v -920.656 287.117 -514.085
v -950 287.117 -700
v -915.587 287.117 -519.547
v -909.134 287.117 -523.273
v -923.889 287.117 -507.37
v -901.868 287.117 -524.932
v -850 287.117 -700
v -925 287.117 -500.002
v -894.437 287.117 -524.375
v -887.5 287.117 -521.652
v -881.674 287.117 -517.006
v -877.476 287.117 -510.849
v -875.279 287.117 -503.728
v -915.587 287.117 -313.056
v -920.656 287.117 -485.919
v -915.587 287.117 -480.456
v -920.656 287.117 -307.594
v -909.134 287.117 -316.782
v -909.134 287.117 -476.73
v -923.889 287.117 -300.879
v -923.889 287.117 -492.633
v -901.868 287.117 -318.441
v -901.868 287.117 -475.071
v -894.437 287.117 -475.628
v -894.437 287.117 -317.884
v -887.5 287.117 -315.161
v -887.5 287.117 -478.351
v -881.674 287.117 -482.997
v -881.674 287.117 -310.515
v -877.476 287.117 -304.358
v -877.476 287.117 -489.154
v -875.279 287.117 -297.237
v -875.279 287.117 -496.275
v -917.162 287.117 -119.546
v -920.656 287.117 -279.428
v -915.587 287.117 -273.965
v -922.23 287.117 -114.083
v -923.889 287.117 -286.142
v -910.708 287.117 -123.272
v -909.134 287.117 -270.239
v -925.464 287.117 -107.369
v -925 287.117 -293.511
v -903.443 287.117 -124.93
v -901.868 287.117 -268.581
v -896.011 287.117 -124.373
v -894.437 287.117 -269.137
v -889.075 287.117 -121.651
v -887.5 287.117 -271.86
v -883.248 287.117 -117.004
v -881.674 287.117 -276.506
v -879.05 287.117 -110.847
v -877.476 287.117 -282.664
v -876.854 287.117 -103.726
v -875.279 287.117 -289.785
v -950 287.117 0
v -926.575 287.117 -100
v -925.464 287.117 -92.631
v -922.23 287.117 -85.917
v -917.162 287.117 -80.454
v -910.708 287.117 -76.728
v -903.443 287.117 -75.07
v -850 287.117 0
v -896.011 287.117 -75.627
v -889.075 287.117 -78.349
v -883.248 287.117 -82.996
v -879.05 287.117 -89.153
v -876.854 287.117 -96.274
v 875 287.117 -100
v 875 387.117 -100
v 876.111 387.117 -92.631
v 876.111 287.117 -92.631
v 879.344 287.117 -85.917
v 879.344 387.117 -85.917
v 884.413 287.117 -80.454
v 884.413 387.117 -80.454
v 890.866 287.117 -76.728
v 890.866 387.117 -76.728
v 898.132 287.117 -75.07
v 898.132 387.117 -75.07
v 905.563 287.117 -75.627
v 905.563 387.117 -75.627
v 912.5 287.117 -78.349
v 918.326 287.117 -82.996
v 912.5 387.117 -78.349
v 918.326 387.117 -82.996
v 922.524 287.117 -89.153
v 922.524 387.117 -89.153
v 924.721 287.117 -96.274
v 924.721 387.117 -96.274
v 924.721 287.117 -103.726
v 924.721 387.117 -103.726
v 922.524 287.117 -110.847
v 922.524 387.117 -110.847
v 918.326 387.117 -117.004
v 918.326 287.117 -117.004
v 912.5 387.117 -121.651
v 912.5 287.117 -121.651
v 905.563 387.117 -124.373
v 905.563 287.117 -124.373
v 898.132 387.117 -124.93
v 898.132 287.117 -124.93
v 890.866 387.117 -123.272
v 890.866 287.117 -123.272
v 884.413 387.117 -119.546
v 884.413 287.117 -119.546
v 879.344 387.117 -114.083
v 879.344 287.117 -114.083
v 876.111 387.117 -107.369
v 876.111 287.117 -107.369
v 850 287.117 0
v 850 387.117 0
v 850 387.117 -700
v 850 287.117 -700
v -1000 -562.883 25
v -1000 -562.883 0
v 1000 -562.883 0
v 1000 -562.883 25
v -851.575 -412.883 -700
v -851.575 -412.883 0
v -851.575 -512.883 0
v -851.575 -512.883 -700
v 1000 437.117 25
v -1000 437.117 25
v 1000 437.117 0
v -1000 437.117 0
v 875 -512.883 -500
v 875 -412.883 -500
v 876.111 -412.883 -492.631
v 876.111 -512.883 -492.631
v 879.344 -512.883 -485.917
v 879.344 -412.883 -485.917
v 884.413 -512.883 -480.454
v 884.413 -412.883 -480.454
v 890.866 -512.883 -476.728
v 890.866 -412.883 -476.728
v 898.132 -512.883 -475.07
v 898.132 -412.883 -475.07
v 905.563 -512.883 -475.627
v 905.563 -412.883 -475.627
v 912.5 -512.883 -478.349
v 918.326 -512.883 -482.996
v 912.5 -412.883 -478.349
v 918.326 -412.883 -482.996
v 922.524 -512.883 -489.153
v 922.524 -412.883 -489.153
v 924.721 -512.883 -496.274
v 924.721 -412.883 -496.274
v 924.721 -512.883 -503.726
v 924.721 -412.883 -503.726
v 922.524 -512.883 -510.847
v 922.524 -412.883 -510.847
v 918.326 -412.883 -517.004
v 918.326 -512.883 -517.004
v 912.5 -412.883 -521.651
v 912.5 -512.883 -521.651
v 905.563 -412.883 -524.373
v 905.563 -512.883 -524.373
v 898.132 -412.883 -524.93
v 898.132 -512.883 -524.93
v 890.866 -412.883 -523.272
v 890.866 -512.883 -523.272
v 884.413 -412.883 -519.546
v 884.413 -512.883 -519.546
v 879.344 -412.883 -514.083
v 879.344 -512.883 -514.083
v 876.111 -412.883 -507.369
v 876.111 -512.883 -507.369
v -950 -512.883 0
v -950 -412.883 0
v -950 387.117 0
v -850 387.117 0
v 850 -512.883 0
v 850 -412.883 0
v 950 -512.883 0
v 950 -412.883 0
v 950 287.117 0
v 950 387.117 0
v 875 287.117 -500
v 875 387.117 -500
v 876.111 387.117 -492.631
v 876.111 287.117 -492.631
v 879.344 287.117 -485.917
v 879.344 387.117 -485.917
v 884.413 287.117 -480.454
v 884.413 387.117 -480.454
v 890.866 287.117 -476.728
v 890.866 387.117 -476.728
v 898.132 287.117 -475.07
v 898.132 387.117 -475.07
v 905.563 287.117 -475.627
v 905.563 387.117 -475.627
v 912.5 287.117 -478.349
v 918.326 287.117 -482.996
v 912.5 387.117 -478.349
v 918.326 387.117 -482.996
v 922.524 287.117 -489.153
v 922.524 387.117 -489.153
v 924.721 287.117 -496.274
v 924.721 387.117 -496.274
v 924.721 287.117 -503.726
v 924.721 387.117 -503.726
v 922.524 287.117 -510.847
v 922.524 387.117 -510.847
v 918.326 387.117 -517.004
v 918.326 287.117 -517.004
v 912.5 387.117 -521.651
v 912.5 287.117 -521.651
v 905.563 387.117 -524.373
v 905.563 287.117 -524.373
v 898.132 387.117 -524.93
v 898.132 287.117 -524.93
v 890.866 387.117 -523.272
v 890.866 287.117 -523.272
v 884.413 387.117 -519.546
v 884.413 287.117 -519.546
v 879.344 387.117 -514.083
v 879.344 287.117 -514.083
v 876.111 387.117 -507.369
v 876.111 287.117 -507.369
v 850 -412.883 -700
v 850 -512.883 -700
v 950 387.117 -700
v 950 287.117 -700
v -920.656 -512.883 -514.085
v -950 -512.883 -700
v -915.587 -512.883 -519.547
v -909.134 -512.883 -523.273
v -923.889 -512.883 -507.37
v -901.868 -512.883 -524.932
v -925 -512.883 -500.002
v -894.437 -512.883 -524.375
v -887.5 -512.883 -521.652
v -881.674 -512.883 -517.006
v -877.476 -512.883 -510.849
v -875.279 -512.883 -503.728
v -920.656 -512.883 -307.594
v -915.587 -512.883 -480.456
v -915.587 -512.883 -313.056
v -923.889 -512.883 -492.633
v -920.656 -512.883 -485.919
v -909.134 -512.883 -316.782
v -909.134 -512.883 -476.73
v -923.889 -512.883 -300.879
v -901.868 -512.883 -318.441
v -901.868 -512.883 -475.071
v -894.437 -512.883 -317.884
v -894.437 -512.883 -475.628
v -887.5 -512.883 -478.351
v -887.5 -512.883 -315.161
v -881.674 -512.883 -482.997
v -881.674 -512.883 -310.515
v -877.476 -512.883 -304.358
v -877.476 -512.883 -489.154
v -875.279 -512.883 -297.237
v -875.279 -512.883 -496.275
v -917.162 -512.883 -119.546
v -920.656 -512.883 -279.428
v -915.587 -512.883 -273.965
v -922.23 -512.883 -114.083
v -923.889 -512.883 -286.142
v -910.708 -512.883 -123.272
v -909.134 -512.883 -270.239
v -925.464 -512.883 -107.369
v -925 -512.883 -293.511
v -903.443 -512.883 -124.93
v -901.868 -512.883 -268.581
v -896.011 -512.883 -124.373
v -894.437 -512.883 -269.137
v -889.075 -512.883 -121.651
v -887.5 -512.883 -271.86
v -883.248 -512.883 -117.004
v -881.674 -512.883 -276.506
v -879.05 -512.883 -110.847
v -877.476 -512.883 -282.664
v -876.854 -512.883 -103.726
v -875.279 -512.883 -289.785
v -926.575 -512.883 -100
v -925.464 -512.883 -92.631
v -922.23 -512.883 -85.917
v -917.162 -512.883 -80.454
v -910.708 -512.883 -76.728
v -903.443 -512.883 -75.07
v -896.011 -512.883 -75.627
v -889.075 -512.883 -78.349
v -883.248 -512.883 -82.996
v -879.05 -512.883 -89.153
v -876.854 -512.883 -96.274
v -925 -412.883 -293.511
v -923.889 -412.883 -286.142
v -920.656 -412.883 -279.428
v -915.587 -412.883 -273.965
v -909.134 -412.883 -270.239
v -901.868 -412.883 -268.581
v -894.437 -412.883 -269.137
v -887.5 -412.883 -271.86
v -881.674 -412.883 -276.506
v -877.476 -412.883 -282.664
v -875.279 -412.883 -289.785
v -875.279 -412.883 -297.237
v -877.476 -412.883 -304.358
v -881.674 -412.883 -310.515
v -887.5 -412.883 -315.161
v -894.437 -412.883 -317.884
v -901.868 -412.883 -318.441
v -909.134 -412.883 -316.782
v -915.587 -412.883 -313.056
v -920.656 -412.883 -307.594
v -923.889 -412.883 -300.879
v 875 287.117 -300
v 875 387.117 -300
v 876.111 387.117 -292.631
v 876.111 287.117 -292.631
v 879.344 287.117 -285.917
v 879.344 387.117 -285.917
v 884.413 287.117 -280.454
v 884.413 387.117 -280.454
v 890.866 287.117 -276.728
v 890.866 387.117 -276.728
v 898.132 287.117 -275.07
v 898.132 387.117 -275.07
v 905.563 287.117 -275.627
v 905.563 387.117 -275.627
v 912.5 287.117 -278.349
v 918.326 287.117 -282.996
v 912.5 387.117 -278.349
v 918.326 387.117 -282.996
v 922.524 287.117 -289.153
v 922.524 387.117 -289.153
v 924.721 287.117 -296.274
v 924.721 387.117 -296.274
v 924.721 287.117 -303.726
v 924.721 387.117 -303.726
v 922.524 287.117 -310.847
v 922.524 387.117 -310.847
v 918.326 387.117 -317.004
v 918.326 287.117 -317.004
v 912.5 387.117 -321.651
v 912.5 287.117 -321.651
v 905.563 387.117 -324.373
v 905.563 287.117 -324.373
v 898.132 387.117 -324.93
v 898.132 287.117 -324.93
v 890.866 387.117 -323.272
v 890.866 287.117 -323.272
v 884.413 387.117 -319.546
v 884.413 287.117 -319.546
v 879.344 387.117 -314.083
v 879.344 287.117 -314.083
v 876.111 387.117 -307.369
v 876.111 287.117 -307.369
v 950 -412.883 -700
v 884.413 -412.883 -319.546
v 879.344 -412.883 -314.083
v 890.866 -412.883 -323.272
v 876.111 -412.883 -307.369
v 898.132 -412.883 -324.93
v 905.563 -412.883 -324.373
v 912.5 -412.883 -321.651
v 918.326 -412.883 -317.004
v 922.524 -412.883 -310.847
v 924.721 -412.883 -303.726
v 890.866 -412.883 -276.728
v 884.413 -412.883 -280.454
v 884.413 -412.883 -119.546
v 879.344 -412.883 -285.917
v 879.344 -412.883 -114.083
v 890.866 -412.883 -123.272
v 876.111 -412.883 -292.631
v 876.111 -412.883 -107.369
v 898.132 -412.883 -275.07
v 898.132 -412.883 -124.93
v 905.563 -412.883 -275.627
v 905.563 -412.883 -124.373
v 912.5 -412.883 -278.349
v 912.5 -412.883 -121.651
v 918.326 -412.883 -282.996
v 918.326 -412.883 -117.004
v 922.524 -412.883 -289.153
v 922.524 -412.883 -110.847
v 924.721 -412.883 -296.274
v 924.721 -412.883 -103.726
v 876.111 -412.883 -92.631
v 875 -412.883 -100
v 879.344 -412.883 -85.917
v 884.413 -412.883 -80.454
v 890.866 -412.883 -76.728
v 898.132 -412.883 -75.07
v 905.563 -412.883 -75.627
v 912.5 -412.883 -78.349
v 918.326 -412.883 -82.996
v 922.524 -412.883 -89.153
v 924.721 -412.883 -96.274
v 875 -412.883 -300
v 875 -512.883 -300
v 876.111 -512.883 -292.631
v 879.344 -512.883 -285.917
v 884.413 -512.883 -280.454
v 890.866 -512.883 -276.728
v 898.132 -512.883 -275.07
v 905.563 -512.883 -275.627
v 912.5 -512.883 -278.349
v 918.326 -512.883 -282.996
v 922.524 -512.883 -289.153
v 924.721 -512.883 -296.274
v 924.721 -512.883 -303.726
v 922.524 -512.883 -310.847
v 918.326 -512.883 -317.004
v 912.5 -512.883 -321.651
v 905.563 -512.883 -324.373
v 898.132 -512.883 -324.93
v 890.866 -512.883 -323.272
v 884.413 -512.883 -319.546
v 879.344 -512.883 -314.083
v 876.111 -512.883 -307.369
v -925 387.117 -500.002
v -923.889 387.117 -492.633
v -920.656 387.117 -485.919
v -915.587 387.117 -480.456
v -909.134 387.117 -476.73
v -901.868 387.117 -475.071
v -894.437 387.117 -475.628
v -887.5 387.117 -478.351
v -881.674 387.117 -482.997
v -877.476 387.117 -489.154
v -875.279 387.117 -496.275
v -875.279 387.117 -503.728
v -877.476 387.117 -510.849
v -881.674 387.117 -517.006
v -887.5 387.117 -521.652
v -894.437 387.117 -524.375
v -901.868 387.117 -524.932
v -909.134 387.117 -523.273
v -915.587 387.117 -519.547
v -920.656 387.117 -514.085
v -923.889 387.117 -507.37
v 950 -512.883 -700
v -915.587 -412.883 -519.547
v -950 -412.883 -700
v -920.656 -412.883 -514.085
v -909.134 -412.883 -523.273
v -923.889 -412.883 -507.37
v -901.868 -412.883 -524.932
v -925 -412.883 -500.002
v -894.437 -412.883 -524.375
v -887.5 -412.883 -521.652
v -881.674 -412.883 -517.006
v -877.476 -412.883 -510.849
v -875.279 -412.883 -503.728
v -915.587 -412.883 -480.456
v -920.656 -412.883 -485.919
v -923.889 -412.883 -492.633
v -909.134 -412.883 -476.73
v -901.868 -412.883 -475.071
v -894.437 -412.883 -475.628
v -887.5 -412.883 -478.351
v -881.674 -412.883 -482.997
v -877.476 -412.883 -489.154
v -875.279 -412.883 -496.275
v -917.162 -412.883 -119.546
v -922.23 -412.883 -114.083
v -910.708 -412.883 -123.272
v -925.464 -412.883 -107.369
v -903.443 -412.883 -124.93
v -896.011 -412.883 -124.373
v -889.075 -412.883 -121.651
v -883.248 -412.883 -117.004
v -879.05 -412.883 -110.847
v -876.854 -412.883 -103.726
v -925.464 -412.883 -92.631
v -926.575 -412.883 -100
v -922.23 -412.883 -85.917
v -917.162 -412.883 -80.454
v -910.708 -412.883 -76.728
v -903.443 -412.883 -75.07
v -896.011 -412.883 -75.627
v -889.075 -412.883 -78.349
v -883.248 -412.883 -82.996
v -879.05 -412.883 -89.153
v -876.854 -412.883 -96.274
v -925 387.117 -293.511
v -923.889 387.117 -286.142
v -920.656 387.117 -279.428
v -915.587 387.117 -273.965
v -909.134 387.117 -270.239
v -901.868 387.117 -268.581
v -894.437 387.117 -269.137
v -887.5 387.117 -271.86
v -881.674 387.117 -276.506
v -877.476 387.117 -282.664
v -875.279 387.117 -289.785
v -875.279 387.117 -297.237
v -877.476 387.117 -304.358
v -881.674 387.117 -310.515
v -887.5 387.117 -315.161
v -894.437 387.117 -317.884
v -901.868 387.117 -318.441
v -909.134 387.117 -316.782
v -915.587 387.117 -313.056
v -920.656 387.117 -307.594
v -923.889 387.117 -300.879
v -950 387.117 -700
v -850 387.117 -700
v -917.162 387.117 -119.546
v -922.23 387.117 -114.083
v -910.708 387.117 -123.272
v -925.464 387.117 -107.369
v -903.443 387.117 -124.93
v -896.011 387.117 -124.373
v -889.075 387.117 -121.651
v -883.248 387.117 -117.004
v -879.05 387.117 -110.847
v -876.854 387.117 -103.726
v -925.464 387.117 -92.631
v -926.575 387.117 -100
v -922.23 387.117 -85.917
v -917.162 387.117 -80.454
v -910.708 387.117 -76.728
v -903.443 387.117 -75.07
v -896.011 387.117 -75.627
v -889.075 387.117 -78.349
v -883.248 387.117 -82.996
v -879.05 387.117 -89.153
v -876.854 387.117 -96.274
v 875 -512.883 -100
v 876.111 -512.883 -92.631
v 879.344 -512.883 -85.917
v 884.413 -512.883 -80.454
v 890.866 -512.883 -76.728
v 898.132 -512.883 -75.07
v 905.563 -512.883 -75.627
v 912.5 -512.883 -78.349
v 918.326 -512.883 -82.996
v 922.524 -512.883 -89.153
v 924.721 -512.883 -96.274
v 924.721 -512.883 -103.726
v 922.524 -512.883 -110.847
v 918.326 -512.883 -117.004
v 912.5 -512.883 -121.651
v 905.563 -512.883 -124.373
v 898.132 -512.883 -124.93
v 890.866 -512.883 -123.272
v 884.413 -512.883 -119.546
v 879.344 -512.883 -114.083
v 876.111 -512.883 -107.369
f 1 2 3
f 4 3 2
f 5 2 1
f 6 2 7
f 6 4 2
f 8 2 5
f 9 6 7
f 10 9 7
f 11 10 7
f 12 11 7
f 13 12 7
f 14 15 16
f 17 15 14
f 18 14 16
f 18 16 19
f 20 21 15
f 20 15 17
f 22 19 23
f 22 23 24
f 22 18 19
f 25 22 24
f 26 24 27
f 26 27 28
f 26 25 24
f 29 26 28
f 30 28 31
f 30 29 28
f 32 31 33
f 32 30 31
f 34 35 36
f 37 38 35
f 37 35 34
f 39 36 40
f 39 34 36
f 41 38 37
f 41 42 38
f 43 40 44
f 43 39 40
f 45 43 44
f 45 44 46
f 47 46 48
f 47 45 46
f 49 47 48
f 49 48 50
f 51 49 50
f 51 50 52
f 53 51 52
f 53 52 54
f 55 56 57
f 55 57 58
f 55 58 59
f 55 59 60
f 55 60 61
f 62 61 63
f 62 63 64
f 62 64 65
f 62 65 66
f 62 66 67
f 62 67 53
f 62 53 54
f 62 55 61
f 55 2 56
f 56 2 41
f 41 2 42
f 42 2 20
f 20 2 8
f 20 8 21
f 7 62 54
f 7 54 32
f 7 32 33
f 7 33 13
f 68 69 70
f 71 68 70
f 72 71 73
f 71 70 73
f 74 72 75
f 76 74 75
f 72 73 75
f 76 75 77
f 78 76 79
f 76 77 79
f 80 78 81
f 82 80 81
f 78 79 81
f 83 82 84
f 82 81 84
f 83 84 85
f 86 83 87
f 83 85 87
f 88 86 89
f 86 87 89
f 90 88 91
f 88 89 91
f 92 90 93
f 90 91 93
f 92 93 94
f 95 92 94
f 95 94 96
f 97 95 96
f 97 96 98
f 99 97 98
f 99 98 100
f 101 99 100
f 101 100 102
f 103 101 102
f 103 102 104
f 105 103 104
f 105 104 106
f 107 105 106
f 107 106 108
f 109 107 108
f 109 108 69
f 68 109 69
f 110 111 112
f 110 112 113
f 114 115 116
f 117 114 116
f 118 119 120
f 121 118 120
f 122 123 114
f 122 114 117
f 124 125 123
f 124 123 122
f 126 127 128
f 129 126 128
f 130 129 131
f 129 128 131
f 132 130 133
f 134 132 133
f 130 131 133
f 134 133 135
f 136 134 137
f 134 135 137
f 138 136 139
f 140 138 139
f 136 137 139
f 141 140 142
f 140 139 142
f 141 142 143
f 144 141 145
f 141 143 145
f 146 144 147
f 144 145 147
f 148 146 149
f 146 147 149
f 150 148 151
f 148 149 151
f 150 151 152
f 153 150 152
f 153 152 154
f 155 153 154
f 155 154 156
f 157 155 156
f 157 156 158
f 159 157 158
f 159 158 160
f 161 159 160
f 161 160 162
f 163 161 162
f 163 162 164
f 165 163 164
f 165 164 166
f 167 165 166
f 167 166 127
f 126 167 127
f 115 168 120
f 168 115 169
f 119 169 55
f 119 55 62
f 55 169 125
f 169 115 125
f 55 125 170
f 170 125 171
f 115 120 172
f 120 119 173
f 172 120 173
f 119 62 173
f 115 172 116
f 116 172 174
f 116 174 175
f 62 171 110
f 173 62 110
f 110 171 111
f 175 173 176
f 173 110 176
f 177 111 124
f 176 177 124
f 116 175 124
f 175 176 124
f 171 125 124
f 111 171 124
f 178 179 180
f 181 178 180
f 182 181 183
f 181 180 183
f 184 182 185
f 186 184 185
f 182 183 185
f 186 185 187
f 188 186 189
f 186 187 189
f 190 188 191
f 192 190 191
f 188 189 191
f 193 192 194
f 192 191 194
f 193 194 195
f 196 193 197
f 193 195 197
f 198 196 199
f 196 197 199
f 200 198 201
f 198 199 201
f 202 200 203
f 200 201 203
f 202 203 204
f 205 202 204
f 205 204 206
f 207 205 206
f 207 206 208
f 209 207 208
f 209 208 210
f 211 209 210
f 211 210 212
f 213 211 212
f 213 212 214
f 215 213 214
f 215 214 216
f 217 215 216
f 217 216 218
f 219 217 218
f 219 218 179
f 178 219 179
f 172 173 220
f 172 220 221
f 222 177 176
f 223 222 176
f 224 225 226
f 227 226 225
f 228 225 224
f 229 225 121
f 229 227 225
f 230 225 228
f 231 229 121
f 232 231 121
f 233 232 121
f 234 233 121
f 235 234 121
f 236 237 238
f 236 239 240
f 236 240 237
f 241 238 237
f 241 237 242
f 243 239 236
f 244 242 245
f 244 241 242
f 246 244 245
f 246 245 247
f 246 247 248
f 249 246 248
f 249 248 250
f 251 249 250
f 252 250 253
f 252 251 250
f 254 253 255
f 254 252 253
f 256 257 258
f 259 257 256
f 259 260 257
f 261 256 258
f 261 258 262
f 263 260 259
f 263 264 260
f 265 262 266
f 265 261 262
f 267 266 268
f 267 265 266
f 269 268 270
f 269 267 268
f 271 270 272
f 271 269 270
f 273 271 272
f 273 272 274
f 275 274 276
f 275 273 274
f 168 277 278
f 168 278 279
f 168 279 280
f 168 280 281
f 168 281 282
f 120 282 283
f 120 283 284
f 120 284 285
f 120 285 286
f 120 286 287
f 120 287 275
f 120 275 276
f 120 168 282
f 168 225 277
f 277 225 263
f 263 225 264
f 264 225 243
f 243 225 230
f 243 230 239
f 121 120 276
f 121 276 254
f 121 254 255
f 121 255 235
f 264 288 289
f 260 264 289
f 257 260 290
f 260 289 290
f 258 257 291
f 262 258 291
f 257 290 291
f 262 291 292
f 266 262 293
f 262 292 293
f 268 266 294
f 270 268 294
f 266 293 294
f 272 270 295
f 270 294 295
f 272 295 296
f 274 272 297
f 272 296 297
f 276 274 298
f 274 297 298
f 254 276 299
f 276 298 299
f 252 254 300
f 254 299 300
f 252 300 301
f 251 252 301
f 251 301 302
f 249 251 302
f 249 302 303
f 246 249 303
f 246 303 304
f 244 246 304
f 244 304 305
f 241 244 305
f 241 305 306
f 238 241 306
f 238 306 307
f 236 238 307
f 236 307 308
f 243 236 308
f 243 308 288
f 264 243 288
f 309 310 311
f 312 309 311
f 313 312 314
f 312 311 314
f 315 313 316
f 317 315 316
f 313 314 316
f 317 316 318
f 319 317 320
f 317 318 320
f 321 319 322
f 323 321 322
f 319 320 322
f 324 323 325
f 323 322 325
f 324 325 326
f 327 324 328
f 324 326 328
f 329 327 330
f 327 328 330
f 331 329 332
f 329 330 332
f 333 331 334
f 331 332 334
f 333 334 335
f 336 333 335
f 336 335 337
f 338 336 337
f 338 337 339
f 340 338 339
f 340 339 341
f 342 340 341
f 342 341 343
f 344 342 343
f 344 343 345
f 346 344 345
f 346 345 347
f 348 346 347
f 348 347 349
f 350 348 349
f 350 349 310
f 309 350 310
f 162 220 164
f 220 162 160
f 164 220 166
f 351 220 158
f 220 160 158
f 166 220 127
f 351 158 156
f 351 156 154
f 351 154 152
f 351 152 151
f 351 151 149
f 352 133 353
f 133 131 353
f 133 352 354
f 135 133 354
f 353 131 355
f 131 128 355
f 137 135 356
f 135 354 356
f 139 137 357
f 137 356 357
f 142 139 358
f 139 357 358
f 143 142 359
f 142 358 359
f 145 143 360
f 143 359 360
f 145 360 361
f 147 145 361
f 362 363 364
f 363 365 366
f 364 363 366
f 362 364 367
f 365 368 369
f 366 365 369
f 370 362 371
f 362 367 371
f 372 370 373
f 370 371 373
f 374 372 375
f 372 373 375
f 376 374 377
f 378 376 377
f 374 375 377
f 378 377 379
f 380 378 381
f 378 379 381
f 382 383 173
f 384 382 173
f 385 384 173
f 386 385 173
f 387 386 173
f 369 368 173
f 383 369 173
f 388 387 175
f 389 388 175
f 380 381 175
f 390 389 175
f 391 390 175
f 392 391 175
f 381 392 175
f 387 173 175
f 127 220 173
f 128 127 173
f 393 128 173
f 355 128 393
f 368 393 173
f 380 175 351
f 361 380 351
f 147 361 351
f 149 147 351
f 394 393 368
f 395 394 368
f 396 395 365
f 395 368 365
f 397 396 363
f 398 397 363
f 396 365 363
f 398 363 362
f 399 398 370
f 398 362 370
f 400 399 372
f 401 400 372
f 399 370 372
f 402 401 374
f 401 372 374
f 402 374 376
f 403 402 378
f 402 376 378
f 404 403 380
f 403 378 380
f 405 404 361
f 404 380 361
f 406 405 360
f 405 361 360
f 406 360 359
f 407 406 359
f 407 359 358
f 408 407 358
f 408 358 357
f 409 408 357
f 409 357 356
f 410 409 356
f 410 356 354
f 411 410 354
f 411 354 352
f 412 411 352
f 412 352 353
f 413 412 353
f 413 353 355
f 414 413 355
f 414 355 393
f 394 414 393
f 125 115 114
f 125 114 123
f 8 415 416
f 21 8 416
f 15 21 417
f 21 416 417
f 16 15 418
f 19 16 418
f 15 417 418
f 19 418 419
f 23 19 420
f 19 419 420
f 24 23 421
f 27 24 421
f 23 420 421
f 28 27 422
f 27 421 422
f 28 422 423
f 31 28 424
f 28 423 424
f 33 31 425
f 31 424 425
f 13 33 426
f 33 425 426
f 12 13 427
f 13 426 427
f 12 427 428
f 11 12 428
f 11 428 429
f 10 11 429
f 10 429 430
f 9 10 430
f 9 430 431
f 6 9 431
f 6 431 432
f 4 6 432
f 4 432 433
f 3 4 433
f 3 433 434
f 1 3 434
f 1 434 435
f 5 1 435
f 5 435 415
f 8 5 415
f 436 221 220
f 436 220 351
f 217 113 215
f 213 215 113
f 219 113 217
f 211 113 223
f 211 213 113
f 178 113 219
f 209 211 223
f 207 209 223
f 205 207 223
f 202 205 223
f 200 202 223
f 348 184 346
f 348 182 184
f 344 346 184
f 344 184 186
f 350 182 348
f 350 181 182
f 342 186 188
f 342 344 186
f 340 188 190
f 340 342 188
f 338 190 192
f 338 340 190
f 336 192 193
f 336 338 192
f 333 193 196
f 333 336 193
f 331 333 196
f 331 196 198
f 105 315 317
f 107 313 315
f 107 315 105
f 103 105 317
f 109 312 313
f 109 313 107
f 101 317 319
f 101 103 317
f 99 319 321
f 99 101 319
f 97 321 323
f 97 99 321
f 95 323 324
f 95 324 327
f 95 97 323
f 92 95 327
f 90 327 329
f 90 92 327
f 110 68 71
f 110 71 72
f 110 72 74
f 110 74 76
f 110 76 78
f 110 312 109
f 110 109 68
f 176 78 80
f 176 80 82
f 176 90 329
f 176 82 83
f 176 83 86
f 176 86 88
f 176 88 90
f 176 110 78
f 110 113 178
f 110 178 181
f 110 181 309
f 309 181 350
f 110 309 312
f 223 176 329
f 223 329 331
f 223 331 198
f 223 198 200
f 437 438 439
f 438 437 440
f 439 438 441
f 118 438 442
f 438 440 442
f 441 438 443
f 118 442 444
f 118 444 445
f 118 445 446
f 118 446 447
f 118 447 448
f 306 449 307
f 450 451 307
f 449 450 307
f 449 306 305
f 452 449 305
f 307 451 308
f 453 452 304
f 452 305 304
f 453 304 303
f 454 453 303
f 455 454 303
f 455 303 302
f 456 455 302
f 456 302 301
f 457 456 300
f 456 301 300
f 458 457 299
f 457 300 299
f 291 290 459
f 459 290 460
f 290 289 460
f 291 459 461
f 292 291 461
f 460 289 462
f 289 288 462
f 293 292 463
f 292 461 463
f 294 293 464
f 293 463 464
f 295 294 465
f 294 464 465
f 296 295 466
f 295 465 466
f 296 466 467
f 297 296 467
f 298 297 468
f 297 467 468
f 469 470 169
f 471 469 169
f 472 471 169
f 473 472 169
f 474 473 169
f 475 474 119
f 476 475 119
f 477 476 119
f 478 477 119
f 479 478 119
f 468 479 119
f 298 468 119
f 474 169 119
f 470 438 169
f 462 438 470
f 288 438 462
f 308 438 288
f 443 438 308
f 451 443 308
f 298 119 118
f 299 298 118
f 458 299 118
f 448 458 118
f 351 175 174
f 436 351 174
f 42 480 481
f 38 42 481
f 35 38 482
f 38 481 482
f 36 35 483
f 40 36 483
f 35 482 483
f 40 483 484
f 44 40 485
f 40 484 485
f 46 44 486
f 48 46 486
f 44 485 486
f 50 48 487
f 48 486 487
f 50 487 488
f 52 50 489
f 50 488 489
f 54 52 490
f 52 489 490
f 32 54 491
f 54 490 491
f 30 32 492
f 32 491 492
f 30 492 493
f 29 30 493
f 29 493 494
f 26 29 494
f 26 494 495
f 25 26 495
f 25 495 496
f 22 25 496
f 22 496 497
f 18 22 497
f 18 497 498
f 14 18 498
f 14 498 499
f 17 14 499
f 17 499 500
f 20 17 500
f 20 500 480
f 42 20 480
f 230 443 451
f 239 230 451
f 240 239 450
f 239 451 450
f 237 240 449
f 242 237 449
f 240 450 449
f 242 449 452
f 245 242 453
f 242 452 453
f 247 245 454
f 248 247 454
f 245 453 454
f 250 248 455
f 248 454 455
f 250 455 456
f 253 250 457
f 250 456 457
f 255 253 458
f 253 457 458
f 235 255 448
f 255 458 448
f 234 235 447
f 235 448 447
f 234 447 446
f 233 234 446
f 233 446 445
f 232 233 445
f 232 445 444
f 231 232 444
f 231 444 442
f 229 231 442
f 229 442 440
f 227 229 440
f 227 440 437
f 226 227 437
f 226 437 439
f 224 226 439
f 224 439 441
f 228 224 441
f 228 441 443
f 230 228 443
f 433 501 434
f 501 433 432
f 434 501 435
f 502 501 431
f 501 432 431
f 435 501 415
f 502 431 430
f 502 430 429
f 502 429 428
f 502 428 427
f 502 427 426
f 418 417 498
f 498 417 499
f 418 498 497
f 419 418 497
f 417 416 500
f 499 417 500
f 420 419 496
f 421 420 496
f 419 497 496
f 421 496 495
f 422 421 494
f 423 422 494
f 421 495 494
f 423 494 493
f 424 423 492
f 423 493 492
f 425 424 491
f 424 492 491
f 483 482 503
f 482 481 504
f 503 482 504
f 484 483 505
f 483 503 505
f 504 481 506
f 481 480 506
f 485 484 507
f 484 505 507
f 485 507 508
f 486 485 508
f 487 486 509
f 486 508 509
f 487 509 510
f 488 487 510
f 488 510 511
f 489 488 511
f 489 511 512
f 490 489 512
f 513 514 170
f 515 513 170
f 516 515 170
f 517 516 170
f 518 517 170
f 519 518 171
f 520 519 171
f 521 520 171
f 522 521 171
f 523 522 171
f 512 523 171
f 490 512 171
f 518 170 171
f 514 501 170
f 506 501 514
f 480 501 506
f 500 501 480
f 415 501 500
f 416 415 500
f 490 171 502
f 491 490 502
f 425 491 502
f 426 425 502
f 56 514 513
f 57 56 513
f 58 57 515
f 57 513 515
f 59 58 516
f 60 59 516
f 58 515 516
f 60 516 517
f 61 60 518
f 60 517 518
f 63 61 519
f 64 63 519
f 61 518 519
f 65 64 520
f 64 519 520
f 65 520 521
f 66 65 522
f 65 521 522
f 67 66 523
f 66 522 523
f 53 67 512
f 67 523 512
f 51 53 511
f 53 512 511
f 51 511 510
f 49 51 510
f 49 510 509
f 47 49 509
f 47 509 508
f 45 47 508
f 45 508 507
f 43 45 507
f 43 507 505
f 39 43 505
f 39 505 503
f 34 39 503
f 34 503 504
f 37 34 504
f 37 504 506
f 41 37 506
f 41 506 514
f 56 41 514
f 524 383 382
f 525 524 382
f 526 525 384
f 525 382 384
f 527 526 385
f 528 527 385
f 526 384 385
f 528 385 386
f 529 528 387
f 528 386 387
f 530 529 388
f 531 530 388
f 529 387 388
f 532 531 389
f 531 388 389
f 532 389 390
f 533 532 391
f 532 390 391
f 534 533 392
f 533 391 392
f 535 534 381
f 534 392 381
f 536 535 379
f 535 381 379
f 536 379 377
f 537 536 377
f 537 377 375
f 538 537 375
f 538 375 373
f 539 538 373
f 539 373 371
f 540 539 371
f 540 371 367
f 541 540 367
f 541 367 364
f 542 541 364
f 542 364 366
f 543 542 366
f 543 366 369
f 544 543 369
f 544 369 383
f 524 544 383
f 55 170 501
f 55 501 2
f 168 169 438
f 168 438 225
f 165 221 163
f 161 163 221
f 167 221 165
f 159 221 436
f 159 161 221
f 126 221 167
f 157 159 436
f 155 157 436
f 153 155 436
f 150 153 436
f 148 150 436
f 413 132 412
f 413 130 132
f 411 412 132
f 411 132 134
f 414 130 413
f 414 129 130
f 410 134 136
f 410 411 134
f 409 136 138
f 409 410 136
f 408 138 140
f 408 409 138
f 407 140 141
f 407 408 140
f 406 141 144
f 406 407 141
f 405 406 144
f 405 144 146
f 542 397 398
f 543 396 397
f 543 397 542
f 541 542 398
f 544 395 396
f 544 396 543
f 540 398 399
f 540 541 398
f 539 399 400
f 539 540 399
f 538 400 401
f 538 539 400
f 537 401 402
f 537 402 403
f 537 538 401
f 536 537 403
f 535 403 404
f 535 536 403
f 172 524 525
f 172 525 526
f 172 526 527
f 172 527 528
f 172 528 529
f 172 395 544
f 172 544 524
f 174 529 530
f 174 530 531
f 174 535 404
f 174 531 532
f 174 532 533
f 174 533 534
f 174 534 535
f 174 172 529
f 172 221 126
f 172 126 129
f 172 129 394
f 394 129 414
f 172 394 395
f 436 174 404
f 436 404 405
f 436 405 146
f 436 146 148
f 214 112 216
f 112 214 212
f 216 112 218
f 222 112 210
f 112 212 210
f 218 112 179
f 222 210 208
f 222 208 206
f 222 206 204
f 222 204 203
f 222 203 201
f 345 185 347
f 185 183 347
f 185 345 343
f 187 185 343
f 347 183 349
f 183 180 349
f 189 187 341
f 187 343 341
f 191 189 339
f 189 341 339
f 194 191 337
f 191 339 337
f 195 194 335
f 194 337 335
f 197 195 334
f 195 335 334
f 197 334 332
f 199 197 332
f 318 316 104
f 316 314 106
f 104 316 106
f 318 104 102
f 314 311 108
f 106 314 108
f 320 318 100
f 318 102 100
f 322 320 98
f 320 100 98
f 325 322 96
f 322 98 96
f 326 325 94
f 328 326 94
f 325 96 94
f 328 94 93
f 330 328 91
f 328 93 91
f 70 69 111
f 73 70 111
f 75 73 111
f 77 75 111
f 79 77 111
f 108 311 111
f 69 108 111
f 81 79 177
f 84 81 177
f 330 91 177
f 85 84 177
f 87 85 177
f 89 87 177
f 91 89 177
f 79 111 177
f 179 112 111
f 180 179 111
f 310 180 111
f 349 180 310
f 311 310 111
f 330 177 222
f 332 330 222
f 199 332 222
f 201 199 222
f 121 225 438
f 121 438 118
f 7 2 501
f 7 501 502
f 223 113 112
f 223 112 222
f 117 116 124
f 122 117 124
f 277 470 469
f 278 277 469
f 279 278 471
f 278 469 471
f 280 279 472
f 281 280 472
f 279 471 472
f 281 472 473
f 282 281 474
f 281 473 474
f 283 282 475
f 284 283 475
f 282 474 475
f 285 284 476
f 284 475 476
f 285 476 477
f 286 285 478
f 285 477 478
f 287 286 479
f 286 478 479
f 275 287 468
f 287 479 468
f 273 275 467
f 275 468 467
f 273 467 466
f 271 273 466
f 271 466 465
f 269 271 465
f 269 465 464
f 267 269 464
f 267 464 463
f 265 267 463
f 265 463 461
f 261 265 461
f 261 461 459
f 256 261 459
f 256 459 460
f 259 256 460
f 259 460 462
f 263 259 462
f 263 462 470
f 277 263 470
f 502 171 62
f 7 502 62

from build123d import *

# Parameters (mm, degrees)
F0_W     = 2000
F0_H     = 1000
F1_DEPTH = 25
F2_W     = 98.425484
F2_H     = 100
F3_DEPTH = 700
F4_W     = 100
F4_H     = 100
F5_DEPTH = 700
F6_W     = 100
F6_H     = 100
F7_DEPTH = 700
F8_W     = 100
F8_H     = 100
F9_DEPTH = 700
F11_D    = 50
F13_D    = 50
F15_D    = 50
F17_D    = 50
F19_D    = 50
F21_D    = 50


with BuildPart() as f1:
    # F0 (on Top) → F1 (new body)
    with BuildSketch(Plane.XY):
        with Locations((0, -62.883471)):
            Rectangle(F0_W, F0_H)
    extrude(amount=F1_DEPTH)

    # F2 (on face) → F3 (join)
    with BuildSketch(Plane(origin=(0, 0, 0), x_dir=(1, 0, 0), z_dir=(0, 0, -1))):
        with Locations((-900.787258, 462.883471)):
            Rectangle(F2_W, F2_H)
    extrude(amount=F3_DEPTH)

    # F4 (on face) → F5 (join)
    with BuildSketch(Plane(origin=(0, 0, 0), x_dir=(1, 0, 0), z_dir=(0, 0, -1))):
        with Locations((-900, -337.116529)):
            Rectangle(F4_W, F4_H)
    extrude(amount=F5_DEPTH)

    # F6 (on face) → F7 (join)
    with BuildSketch(Plane(origin=(0, 0, 0), x_dir=(1, 0, 0), z_dir=(0, 0, -1))):
        with Locations((900, -337.116529)):
            Rectangle(F6_W, F6_H)
    extrude(amount=F7_DEPTH)

    # F8 (on face) → F9 (join)
    with BuildSketch(Plane(origin=(0, 0, 0), x_dir=(1, 0, 0), z_dir=(0, 0, -1))):
        with Locations((900, 462.883471)):
            Rectangle(F8_W, F8_H)
    extrude(amount=F9_DEPTH)

    # F11 (through all)
    with Locations(Plane.XZ.offset(512.883471)):
        with Locations((-900, -500.001549)):
            Hole(F11_D / 2)

    # F13 (through all)
    with Locations(Plane.XZ.offset(512.883471)):
        with Locations((-900, -293.510616)):
            Hole(F13_D / 2)

    # F15 (through all)
    with Locations(Plane.XZ.offset(512.883471)):
        with Locations((-901.574516, -100)):
            Hole(F15_D / 2)

    # F17 (through all)
    with Locations(Plane.XZ.offset(512.883471)):
        with Locations((900, -500)):
            Hole(F17_D / 2)

    # F19 (through all)
    with Locations(Plane.XZ.offset(512.883471)):
        with Locations((900, -300)):
            Hole(F19_D / 2)

    # F21 (through all)
    with Locations(Plane.XZ.offset(512.883471)):
        with Locations((900, -100)):
            Hole(F21_D / 2)


solid = f1.part
